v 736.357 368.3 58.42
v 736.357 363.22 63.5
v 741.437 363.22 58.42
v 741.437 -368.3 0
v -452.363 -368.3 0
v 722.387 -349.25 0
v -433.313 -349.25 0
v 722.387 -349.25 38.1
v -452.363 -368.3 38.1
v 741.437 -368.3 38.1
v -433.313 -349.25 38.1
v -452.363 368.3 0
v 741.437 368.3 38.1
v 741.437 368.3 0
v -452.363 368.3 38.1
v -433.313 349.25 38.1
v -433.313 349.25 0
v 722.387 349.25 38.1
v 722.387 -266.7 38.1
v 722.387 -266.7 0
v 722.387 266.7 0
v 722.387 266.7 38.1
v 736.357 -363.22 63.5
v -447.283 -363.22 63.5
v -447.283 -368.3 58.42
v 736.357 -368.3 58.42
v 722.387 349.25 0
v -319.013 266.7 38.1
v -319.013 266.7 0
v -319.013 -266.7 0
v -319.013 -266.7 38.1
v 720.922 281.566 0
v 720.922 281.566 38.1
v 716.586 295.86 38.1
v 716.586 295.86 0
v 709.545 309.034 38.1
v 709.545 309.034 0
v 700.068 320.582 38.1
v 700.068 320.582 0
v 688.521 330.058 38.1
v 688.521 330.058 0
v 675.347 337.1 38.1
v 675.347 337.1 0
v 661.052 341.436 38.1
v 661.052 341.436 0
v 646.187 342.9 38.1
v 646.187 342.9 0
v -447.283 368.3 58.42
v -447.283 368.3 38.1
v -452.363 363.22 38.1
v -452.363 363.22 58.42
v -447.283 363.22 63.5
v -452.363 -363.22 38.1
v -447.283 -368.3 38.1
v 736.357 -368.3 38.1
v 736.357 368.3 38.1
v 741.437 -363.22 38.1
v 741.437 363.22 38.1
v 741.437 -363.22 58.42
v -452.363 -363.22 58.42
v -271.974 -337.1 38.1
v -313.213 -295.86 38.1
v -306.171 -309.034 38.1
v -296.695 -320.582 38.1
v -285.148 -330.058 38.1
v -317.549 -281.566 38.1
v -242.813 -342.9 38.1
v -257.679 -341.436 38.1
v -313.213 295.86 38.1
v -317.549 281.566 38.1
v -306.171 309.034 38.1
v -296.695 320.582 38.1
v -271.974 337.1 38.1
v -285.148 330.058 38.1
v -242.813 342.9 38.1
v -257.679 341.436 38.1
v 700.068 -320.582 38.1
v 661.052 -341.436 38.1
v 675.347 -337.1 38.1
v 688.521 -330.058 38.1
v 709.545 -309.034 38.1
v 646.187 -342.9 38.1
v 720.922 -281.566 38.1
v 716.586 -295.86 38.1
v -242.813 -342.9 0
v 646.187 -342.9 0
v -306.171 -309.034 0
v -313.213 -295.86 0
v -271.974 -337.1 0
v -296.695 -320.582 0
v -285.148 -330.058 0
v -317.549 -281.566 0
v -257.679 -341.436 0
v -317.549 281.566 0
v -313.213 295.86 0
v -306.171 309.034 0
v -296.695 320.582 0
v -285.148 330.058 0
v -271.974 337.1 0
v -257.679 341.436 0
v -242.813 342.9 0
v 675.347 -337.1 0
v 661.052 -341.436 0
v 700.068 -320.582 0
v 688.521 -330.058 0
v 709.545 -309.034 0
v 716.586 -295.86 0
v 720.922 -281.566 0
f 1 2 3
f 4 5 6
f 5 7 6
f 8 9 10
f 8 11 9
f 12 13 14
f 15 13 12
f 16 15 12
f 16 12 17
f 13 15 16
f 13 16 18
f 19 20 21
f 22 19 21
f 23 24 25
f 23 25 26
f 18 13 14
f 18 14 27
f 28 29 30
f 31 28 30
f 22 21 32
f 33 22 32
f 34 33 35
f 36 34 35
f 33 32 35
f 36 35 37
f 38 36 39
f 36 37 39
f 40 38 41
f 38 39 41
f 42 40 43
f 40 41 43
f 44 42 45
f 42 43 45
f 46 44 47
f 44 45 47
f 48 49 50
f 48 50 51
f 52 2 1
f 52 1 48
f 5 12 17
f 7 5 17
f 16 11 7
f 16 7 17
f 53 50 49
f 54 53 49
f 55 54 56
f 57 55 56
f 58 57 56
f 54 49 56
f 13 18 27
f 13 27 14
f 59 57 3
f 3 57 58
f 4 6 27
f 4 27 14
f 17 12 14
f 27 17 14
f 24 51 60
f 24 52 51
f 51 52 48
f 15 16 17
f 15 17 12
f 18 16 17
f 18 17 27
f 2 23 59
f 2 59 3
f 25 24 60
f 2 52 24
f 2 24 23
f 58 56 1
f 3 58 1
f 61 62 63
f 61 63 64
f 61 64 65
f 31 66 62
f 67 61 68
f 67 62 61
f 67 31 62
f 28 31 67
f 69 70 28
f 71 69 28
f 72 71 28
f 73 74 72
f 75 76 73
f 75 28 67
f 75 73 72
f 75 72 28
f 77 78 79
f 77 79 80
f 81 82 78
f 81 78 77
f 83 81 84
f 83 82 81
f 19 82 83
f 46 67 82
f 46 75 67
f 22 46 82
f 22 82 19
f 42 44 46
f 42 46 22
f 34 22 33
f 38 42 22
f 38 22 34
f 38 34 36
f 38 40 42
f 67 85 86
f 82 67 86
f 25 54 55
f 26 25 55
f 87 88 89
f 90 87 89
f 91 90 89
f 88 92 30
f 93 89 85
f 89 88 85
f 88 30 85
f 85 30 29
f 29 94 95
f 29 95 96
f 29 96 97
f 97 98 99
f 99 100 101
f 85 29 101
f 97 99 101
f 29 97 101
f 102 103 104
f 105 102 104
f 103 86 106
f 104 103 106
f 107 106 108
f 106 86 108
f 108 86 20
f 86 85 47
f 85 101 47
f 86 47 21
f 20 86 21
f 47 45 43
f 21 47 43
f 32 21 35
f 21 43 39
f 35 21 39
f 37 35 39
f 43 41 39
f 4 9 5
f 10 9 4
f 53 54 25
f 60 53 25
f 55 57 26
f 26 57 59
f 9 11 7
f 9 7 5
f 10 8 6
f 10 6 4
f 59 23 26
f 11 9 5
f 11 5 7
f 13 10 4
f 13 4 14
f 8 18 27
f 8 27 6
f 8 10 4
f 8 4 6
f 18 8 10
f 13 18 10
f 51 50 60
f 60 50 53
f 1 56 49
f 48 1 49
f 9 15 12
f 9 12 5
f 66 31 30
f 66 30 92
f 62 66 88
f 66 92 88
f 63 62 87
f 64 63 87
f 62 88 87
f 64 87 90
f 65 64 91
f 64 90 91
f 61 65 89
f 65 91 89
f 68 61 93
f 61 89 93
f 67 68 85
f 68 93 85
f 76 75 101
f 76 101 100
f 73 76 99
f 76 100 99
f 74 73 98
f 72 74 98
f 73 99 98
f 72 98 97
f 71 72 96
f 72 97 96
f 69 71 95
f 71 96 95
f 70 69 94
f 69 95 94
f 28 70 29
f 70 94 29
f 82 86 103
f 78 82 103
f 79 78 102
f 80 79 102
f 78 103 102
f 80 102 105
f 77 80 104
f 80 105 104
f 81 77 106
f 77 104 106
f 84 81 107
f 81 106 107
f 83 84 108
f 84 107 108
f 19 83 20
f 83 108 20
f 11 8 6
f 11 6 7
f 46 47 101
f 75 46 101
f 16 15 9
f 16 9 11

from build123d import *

# Parameters (mm, degrees)
F1_DEPTH = 38.1
F3_DEPTH = 38.1
F4_DEPTH = 25.4
F5_DEPTH = 38.1
F6_SIZE  = 5.08


with BuildPart() as f1:
    # F0 (on Top) → F1 (new body)
    with BuildSketch(Plane.XY):
        with BuildLine():
            Line((-242.81340909, -342.9), (646.18659091, -342.9))
            ThreePointArc((646.18659091, -342.9), (700.0681276364, -320.5815367264), (722.38659091, -266.7))
            Line((722.38659091, -266.7), (722.38659091, 266.7))
            ThreePointArc((722.38659091, 266.7), (700.0681276364, 320.5815367264), (646.18659091, 342.9))
            Line((646.18659091, 342.9), (-242.81340909, 342.9))
            ThreePointArc((-242.81340909, 342.9), (-296.6949458165, 320.5815367264), (-319.01340909, 266.7))
            Line((-319.01340909, 266.7), (-319.01340909, -266.7))
            ThreePointArc((-319.01340909, -266.7), (-296.6949458165, -320.5815367264), (-242.81340909, -342.9))
        make_face()
    extrude(amount=F1_DEPTH)


with BuildPart() as f3:
    # F2 (on face) → F3 (new body)
    with BuildSketch(Plane.XY.offset(38.1)):
        Polygon((722.38659091, 349.25), (741.43659091, 368.3), (-452.36340909, 368.3), (-433.31340909, 349.25), align=None)
    extrude(amount=-F3_DEPTH)


with BuildPart() as f3b:
    # F2 (on face) → F3, piece 2 (new body)
    with BuildSketch(Plane.XY.offset(38.1)):
        Polygon((-452.36340909, -368.3), (741.43659091, -368.3), (722.38659091, -349.25), (-433.31340909, -349.25), align=None)
    extrude(amount=-F3_DEPTH)


with BuildPart() as f4:
    # F2 (on face) → F4 (new body)
    with BuildSketch(Plane.XY.offset(38.1)):
        with BuildLine():
            ThreePointArc((646.18659091, -342.9), (700.0681276364, -320.5815367264), (722.38659091, -266.7))
            Line((722.38659091, -266.7), (722.38659091, 266.7))
            ThreePointArc((722.38659091, 266.7), (700.0681276364, 320.5815367264), (646.18659091, 342.9))
            Line((646.18659091, 342.9), (-242.81340909, 342.9))
            ThreePointArc((-242.81340909, 342.9), (-296.6949458165, 320.5815367264), (-319.01340909, 266.7))
            Line((-319.01340909, 266.7), (-319.01340909, -266.7))
            ThreePointArc((-319.01340909, -266.7), (-296.6949458165, -320.5815367264), (-242.81340909, -342.9))
            Line((-242.81340909, -342.9), (646.18659091, -342.9))
        make_face()
        Polygon((-452.36340909, -368.3), (741.43659091, -368.3), (722.38659091, -349.25), (-433.31340909, -349.25), align=None)
        Polygon((722.38659091, -349.25), (741.43659091, -368.3), (741.43659091, 368.3), (722.38659091, 349.25), (722.38659091, 266.7), (722.38659091, -266.7), align=None)
        Polygon((-452.36340909, 368.3), (-452.36340909, -368.3), (-433.31340909, -349.25), (-433.31340909, 349.25), align=None)
        with BuildLine():
            Line((-433.31340909, -349.25), (722.38659091, -349.25))
            Line((722.38659091, -349.25), (722.38659091, -266.7))
            ThreePointArc((722.38659091, -266.7), (700.0681276364, -320.5815367264), (646.18659091, -342.9))
            Line((646.18659091, -342.9), (-242.81340909, -342.9))
            ThreePointArc((-242.81340909, -342.9), (-296.6949458165, -320.5815367264), (-319.01340909, -266.7))
            Line((-319.01340909, -266.7), (-319.01340909, 266.7))
            ThreePointArc((-319.01340909, 266.7), (-296.6949458165, 320.5815367264), (-242.81340909, 342.9))
            Line((-242.81340909, 342.9), (646.18659091, 342.9))
            ThreePointArc((646.18659091, 342.9), (700.0681276364, 320.5815367264), (722.38659091, 266.7))
            Line((722.38659091, 266.7), (722.38659091, 349.25))
            Line((722.38659091, 349.25), (-433.31340909, 349.25))
            Line((-433.31340909, 349.25), (-433.31340909, -349.25))
        make_face()
        Polygon((722.38659091, 349.25), (741.43659091, 368.3), (-452.36340909, 368.3), (-433.31340909, 349.25), align=None)
    extrude(amount=F4_DEPTH)

    # F6
    f6_edges = [f4.edges().sort_by_distance(p)[0] for p in [
        (-452.363409, 0, 63.5),
        (144.536591, -368.3, 63.5),
        (741.436591, 0, 63.5),
        (144.536591, 368.3, 63.5),
        (741.436591, -368.3, 50.8),
        (741.436591, 368.3, 50.8),
        (-452.363409, -368.3, 50.8),
        (-452.363409, 368.3, 50.8),
    ]]
    chamfer(f6_edges, length=F6_SIZE)


with BuildPart() as f5:
    # F2 (on face) → F5 (new body)
    with BuildSketch(Plane.XY.offset(38.1)):
        Polygon((-452.36340909, 368.3), (-452.36340909, -368.3), (-433.31340909, -349.25), (-433.31340909, 349.25), align=None)
    extrude(amount=-F5_DEPTH)


with BuildPart() as f5b:
    # F2 (on face) → F5, piece 2 (new body)
    with BuildSketch(Plane.XY.offset(38.1)):
        Polygon((722.38659091, -349.25), (741.43659091, -368.3), (741.43659091, 368.3), (722.38659091, 349.25), (722.38659091, 266.7), (722.38659091, -266.7), align=None)
    extrude(amount=-F5_DEPTH)


solid = Compound([f1.part, f3.part, f3b.part, f4.part, f5.part, f5b.part])
